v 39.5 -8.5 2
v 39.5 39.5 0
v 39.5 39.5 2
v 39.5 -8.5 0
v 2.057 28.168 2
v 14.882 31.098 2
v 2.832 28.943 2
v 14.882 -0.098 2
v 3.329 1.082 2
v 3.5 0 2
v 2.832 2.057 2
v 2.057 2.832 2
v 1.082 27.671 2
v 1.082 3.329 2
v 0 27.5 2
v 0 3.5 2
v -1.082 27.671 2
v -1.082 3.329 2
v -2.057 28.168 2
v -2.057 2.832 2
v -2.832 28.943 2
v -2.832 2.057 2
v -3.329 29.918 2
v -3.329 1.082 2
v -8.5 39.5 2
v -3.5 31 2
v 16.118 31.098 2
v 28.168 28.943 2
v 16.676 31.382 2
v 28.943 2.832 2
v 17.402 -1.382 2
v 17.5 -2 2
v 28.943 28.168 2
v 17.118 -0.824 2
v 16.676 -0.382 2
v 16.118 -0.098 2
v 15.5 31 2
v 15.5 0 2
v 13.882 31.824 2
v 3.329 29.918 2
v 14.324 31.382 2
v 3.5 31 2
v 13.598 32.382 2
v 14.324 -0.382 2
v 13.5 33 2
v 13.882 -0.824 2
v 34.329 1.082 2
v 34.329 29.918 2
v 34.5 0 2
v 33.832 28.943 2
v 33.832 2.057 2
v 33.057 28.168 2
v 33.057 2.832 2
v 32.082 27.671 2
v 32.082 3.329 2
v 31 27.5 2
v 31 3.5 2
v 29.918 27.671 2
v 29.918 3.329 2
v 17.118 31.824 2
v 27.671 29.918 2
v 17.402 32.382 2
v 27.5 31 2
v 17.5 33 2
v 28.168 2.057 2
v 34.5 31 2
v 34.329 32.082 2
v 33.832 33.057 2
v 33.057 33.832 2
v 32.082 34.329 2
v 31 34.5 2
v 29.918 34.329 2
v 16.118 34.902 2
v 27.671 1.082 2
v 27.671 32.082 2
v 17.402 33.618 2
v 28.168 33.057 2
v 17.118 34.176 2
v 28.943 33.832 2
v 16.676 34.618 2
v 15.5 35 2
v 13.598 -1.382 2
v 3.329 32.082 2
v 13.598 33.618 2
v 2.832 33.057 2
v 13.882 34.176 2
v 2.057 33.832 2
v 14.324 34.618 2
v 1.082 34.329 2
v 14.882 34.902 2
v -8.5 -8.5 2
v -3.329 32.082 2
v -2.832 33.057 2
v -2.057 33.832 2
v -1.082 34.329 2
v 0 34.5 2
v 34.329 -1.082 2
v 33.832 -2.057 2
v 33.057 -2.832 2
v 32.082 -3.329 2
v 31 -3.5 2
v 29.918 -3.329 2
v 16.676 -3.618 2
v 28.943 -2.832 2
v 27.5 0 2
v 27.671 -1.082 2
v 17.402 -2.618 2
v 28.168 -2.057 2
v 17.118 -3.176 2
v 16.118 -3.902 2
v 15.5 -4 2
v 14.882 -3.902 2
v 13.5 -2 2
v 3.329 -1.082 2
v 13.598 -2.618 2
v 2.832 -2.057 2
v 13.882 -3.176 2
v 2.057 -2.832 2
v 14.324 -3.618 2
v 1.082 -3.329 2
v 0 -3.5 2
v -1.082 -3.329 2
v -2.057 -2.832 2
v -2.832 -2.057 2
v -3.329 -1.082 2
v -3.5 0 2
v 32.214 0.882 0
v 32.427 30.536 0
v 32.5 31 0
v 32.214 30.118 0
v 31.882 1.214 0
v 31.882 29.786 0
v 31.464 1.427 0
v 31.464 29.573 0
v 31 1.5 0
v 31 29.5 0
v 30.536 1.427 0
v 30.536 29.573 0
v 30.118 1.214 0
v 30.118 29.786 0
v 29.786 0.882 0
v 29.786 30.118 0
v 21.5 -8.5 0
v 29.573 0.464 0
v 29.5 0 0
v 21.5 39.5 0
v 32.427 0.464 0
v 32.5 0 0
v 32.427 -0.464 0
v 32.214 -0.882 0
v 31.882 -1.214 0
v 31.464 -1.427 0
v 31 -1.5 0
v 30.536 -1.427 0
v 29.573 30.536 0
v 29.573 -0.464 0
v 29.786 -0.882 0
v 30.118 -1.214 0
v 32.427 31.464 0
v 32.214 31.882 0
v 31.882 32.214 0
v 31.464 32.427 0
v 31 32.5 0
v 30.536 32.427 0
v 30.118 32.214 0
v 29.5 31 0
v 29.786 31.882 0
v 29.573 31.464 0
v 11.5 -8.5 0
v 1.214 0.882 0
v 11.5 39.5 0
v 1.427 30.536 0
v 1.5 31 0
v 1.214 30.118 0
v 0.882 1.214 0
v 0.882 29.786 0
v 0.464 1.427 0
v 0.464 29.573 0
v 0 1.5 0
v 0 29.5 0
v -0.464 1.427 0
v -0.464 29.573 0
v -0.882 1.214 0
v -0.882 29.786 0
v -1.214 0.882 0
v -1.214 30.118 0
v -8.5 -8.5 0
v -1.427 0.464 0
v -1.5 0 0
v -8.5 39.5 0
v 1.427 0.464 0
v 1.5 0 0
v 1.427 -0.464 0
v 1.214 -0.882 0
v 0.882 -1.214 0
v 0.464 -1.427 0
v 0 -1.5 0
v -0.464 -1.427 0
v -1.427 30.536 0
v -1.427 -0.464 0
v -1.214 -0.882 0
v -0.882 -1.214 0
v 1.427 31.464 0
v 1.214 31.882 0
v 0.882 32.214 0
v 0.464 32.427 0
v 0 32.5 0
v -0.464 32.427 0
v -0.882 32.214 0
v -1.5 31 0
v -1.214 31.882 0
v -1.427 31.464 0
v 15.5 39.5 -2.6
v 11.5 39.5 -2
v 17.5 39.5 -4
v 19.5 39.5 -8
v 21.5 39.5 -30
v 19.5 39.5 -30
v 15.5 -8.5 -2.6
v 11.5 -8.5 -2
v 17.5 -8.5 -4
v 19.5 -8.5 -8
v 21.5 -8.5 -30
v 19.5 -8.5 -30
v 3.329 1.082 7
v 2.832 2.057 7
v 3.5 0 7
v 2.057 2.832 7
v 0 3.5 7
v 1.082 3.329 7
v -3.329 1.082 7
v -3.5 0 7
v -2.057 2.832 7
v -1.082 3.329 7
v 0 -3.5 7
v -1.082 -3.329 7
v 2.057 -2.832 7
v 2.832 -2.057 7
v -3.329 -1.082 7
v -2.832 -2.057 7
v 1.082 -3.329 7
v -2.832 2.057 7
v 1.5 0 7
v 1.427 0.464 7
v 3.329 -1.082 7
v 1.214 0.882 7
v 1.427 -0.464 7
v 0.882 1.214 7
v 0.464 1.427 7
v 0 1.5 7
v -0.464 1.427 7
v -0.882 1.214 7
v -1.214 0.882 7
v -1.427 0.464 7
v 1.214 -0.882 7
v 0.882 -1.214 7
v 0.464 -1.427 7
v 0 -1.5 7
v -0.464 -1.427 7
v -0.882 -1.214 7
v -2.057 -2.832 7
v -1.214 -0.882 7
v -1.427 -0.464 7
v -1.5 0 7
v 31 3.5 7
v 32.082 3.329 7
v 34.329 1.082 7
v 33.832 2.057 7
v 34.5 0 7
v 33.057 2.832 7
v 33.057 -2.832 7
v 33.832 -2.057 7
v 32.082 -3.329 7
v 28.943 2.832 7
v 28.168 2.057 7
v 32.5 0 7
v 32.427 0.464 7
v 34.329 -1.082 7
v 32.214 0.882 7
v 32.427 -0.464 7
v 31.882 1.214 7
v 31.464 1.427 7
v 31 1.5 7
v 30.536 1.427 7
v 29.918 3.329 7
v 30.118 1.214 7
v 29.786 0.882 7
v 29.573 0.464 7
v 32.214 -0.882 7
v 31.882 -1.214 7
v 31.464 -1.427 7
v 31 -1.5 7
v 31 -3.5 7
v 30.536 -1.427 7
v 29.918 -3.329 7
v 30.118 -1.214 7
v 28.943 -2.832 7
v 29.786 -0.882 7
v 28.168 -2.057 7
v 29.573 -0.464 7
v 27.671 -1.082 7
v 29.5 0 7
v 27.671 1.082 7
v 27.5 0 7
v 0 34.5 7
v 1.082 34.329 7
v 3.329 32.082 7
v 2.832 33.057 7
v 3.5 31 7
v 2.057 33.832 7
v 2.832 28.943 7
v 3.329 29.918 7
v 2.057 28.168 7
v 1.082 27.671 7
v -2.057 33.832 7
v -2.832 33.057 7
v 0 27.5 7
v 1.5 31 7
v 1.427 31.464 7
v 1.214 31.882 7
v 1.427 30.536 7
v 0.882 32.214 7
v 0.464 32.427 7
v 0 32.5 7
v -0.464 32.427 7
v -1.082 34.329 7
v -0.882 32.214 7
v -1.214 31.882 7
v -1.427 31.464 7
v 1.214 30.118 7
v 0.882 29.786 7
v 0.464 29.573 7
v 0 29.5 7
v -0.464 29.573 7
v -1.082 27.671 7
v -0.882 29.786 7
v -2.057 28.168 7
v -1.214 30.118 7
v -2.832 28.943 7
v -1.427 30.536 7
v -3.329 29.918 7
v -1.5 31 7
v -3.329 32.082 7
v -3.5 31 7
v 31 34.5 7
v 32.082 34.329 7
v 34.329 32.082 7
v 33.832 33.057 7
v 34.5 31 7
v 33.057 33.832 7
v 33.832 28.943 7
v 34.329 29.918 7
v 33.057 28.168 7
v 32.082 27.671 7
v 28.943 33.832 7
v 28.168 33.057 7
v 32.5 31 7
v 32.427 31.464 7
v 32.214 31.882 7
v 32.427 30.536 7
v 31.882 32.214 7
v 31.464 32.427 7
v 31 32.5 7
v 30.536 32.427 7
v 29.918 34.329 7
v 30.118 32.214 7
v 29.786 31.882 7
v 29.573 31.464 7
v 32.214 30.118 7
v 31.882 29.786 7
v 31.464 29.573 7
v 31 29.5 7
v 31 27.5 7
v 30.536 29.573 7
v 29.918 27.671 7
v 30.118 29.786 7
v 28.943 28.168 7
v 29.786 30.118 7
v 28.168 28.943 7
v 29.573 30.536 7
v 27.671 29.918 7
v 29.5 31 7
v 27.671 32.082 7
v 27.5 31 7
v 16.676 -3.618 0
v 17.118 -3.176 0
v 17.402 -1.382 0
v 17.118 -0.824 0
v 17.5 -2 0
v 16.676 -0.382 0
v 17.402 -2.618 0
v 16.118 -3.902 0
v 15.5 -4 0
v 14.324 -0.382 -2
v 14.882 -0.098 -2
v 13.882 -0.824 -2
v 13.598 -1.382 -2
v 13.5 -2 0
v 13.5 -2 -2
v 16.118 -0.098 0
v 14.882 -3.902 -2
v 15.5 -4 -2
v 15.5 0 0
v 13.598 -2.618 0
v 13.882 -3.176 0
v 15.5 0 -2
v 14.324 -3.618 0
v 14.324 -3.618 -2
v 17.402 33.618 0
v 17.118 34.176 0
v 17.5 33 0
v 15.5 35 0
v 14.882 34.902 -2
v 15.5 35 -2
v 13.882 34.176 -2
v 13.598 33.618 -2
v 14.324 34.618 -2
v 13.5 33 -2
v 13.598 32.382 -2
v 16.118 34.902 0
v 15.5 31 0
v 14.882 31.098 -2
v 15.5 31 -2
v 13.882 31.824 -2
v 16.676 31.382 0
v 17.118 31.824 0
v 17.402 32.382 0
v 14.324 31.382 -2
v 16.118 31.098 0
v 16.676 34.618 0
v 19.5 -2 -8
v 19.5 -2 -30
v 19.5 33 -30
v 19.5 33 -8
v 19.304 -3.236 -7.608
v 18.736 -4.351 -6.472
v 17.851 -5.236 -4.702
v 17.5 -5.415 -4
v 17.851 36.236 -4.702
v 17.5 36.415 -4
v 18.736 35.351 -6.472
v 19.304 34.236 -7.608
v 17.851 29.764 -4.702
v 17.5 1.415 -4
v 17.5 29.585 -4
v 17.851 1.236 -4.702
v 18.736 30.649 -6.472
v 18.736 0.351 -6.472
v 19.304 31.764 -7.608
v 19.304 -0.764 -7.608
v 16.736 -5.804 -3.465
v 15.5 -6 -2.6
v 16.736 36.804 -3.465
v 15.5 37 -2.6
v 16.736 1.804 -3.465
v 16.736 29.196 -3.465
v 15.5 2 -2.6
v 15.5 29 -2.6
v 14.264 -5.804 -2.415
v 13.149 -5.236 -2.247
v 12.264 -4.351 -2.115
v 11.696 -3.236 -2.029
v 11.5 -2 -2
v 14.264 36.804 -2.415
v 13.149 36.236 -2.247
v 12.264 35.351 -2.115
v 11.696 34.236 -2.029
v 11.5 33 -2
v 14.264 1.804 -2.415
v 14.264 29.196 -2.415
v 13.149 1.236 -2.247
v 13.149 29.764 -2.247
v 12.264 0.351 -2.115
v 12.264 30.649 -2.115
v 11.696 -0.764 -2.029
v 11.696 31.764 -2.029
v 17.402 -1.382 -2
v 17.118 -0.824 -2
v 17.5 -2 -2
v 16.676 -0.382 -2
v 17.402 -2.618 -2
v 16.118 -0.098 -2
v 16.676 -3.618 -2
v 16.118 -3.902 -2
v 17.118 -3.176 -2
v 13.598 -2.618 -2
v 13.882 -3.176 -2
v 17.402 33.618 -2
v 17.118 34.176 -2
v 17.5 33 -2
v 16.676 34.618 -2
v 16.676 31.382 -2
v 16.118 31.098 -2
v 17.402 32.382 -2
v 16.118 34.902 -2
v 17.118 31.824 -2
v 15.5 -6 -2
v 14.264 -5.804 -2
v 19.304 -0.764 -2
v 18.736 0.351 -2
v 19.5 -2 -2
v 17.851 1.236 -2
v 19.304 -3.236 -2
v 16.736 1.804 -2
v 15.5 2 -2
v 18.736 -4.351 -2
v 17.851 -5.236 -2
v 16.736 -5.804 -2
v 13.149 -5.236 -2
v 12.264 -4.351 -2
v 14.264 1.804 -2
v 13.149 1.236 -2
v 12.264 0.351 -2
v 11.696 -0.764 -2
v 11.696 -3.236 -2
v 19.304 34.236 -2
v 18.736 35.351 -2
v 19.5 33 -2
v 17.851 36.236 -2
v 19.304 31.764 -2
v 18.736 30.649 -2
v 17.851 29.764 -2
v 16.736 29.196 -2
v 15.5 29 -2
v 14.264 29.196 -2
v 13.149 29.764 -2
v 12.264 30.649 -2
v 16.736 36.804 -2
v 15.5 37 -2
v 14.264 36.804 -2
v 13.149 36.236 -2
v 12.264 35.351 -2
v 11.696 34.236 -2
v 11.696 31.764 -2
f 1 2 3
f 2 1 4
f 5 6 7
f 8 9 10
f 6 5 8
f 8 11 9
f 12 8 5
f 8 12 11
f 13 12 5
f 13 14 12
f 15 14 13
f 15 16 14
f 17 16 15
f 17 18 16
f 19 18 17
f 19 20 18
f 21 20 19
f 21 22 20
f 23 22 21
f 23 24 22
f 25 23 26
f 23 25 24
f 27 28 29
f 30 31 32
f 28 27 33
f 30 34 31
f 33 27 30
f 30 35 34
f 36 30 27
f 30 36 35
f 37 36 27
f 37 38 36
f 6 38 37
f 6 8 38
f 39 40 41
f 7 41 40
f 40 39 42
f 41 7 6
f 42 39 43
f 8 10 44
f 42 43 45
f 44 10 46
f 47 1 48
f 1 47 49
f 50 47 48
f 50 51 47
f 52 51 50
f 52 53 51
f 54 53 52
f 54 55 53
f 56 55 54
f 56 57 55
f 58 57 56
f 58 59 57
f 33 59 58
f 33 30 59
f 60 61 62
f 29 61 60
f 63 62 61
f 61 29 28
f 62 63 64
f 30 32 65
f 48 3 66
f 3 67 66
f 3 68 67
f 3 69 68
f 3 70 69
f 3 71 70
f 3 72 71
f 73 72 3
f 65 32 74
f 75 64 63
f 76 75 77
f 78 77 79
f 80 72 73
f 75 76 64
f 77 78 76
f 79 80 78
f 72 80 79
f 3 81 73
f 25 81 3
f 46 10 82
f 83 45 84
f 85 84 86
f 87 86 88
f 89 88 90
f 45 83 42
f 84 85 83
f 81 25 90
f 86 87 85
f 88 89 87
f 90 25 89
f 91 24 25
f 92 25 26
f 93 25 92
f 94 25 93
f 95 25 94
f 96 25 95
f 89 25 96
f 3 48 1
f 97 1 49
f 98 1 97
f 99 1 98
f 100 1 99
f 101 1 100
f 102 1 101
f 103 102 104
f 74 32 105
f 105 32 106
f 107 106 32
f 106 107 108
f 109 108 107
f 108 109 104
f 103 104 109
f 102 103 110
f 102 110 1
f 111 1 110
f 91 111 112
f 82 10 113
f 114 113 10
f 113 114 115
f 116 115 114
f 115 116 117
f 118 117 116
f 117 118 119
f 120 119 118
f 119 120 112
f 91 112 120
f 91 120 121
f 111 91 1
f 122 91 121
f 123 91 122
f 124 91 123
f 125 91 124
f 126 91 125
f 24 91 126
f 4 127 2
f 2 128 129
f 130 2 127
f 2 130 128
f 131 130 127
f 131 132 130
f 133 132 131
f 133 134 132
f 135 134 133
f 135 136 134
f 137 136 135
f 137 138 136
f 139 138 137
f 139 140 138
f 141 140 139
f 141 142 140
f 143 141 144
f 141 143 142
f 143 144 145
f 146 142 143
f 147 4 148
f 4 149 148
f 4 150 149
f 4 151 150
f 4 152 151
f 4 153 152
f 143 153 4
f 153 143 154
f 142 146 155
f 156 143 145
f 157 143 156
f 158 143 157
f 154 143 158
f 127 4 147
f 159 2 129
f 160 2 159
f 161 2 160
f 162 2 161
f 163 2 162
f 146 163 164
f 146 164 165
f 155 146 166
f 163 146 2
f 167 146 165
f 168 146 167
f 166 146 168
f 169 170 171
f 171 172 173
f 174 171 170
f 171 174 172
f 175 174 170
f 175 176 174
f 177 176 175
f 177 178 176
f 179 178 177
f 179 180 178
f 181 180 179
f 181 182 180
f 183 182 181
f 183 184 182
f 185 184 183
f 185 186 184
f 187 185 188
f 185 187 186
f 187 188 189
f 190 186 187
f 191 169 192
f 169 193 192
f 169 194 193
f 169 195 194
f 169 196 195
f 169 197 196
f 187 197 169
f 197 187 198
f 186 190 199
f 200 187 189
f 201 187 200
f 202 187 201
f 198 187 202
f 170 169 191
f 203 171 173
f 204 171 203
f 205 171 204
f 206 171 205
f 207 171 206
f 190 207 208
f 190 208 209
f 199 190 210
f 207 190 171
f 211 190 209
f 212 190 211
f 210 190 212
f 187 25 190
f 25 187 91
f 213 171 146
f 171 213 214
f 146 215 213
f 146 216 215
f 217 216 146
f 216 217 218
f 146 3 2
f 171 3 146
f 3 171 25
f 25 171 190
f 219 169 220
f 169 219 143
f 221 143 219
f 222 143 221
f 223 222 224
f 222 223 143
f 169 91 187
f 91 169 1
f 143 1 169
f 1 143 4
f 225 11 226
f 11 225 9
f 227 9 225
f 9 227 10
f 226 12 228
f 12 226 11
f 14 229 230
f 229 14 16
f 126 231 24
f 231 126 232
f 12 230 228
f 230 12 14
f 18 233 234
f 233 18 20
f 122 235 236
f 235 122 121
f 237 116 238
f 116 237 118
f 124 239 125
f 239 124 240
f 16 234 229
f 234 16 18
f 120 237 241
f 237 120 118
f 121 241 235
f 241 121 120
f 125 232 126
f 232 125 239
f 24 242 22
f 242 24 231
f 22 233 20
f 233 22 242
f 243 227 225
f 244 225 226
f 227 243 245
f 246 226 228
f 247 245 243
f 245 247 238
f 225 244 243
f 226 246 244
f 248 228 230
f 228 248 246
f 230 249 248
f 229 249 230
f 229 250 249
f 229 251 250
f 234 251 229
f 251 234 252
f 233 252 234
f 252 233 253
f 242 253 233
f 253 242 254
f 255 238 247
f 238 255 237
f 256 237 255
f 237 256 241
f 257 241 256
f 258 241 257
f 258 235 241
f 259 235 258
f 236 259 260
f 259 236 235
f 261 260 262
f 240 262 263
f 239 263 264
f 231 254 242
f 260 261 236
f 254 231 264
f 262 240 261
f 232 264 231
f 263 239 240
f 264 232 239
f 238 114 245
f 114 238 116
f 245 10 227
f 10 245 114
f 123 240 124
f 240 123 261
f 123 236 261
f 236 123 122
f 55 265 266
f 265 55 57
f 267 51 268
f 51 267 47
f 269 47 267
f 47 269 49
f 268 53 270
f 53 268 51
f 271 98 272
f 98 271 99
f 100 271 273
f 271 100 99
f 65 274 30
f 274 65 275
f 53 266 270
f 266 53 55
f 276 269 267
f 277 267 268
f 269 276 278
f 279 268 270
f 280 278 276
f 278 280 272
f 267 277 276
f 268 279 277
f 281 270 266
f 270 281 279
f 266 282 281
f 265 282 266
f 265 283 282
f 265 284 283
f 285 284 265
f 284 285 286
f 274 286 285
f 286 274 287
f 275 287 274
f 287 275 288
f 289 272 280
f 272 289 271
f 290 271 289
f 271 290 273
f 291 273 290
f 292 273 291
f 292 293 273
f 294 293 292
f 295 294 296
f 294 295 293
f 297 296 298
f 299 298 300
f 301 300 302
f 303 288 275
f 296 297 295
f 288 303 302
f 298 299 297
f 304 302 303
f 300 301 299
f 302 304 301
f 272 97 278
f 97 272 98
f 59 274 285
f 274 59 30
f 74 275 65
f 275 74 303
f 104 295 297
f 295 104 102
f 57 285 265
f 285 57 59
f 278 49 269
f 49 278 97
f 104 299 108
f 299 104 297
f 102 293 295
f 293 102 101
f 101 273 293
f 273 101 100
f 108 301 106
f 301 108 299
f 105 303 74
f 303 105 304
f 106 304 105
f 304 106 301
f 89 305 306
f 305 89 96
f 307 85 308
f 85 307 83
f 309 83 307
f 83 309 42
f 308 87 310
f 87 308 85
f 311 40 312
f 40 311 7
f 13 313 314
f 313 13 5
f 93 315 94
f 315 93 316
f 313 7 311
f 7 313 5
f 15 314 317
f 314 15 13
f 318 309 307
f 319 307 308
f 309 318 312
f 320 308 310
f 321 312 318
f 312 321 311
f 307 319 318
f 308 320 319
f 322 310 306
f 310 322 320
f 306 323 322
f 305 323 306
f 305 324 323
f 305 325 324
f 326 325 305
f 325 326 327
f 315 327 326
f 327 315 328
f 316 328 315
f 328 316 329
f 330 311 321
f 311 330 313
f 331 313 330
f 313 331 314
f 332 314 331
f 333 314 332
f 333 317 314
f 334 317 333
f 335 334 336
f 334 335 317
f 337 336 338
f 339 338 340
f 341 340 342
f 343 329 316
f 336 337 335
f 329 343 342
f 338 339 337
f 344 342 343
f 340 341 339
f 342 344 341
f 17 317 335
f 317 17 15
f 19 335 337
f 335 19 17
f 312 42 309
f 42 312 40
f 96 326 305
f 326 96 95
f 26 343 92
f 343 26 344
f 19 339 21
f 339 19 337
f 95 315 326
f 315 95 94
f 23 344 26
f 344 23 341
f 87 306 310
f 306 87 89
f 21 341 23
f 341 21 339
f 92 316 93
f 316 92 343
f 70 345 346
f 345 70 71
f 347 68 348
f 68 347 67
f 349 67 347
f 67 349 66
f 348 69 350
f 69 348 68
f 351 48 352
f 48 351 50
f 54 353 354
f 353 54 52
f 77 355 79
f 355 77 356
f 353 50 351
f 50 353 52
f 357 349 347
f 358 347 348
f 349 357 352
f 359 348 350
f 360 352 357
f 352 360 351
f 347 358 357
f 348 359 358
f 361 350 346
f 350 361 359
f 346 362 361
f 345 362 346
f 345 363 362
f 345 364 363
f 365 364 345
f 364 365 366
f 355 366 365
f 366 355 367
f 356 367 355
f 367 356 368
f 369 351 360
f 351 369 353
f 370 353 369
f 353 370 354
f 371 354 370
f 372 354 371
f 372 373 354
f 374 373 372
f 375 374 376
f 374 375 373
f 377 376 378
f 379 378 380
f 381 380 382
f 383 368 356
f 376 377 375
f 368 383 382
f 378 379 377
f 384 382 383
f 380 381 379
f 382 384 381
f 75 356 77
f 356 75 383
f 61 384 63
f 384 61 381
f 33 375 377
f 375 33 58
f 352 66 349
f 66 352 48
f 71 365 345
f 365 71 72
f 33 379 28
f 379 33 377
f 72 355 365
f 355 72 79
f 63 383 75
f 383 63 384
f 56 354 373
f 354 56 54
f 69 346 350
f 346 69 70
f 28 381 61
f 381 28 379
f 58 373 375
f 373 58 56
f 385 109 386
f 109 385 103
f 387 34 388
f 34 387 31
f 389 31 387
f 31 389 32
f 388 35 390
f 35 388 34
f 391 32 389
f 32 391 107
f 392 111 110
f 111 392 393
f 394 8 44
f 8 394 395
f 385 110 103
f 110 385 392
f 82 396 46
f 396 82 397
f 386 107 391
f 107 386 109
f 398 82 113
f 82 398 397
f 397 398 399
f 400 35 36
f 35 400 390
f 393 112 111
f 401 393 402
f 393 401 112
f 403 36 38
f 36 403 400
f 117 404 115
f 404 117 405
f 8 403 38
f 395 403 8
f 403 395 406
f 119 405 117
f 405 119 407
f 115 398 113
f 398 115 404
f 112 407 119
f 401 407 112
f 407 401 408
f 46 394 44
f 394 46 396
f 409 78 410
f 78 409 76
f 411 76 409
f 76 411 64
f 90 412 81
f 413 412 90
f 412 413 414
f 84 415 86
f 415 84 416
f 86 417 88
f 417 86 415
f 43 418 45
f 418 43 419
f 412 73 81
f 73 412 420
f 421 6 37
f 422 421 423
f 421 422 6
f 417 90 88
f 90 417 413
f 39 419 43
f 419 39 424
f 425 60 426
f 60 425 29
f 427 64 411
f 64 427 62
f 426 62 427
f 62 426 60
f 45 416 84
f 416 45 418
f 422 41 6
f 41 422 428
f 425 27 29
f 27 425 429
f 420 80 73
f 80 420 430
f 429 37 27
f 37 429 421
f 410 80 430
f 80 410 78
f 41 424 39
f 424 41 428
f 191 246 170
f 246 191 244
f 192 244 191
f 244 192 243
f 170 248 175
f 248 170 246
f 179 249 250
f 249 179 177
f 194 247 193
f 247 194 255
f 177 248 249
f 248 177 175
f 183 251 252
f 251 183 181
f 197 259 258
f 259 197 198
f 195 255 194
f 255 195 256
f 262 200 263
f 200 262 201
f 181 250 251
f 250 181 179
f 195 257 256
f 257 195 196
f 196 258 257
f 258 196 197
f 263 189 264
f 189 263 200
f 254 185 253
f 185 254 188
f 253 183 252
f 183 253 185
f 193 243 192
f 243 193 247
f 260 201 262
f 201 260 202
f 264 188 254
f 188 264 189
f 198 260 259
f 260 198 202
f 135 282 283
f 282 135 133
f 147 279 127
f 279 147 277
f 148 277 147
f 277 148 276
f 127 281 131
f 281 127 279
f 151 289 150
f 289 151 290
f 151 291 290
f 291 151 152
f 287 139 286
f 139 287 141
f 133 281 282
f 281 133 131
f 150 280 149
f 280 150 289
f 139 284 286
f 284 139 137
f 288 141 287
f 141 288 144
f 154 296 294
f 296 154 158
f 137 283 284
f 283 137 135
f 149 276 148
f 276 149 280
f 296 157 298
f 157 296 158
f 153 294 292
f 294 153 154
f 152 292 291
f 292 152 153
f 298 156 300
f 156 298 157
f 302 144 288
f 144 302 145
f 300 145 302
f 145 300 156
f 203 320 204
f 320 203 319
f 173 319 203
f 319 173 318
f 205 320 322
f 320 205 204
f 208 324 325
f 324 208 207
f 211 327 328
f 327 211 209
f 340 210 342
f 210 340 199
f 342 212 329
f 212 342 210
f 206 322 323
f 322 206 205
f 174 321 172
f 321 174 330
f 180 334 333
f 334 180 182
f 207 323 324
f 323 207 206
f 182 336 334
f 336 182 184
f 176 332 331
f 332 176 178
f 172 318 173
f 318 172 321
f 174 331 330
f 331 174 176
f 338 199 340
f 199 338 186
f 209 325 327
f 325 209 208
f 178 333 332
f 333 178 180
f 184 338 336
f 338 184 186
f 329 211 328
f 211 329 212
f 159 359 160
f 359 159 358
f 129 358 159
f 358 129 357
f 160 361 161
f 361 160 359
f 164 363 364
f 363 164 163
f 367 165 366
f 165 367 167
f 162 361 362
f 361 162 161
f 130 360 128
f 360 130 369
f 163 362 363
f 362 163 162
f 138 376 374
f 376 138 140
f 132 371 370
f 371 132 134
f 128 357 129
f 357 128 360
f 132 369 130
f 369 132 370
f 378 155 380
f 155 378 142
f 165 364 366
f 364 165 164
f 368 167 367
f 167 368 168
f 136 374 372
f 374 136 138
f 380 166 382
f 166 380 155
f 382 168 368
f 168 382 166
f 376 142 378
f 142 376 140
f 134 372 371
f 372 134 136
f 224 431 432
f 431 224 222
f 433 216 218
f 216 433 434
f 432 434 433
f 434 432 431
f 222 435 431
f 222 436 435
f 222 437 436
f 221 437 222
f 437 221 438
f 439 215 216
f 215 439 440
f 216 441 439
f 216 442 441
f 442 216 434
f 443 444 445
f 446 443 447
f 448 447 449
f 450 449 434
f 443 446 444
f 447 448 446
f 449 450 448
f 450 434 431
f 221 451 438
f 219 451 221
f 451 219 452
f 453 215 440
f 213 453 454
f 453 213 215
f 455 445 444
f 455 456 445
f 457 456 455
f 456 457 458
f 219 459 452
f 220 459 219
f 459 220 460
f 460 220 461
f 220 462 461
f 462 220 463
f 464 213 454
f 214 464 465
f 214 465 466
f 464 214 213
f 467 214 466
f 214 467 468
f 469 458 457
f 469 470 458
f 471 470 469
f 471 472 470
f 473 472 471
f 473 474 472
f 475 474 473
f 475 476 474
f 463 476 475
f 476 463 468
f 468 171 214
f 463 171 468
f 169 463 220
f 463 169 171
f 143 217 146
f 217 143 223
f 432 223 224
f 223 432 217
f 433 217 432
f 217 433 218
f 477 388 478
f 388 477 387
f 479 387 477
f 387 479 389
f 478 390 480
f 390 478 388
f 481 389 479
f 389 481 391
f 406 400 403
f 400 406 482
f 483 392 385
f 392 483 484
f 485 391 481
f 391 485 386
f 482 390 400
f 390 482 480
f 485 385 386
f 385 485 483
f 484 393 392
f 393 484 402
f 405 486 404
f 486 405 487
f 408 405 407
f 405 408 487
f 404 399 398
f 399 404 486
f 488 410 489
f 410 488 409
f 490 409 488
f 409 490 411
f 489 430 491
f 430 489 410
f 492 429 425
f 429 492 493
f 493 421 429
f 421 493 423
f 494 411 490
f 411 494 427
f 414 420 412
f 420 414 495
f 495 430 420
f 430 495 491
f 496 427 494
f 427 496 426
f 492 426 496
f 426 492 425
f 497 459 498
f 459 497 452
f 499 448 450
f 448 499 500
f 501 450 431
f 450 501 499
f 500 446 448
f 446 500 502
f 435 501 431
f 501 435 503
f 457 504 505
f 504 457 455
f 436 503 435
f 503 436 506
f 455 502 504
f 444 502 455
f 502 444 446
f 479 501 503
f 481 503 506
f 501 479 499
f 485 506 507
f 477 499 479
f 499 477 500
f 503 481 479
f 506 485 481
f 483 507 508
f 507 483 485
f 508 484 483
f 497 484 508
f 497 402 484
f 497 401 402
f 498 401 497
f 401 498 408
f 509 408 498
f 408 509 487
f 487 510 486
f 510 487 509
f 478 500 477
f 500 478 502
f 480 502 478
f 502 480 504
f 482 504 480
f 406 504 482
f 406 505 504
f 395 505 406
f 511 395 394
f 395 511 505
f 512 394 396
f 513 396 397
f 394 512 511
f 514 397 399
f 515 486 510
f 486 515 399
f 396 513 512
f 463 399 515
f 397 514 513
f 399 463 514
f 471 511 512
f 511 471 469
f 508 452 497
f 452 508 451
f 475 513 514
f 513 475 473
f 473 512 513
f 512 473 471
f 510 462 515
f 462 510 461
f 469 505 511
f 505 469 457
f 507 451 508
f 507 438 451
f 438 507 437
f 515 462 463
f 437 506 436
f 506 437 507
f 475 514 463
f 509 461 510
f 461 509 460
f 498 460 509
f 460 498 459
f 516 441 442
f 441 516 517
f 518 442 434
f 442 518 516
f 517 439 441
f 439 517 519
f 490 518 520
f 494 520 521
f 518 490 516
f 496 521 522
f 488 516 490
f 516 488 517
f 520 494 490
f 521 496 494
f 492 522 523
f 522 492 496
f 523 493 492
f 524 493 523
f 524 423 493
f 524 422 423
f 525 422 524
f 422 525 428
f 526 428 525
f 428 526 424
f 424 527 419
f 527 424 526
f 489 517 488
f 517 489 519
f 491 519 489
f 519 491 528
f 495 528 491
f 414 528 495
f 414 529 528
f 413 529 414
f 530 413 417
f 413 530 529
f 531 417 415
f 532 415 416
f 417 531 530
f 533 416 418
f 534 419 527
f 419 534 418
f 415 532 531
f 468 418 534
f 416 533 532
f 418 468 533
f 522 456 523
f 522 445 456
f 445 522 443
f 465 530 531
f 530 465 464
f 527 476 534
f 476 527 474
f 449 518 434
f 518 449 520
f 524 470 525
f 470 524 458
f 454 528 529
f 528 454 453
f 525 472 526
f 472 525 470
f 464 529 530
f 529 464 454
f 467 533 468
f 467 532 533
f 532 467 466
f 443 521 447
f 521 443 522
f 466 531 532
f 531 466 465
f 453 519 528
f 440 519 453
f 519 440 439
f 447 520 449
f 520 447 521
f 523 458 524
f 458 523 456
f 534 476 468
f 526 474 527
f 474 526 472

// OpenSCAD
fc_holder = true;
fc_holder_bottom = true;

fc_hole_r = 1.5;
hr = 2;

hole_margin_fc = 31;
fc_h = 7;
hole_margin_holder = 35;
s = 2;
h_down = 30;

$fn =20;
w = hole_margin_fc+2*s+fc_hole_r*2;
margin_base = 5;
if(fc_holder) {
difference(){
union() {
    translate([-s-fc_hole_r-margin_base,-s-fc_hole_r-margin_base,0])cube([w+2*margin_base,w+2*margin_base,s]);
    cylinder(fc_h,fc_hole_r+s,fc_hole_r+s);
    translate([hole_margin_fc,0,0])cylinder(fc_h,fc_hole_r+s,fc_hole_r+s);
    translate([0,hole_margin_fc,0])cylinder(fc_h,fc_hole_r+s,fc_hole_r+s);
    translate([hole_margin_fc,hole_margin_fc,0])cylinder(fc_h,fc_hole_r+s,fc_hole_r+s);
}
    cylinder(fc_h,fc_hole_r,fc_hole_r);
    translate([hole_margin_fc,0,0])cylinder(fc_h,fc_hole_r,fc_hole_r);
    translate([0,hole_margin_fc,0])cylinder(fc_h,fc_hole_r,fc_hole_r);
    translate([hole_margin_fc,hole_margin_fc,0])cylinder(fc_h,fc_hole_r,fc_hole_r);

translate([-fc_hole_r-s+w/2,-fc_hole_r-s+(w-hole_margin_holder)/2,0]){
        cylinder(s,hr,hr);
        translate([0,hole_margin_holder,0])cylinder(s,hr,hr);
    
    }

}
}

if(fc_holder_bottom) {

translate([-s-fc_hole_r+hr*3+w/2,-s-fc_hole_r,-0]){
    difference(){
    rotate([0,90,90])translate([0,0,-margin_base])linear_extrude(w+2*margin_base)polygon([[0,0],[0,hr*5],[s,hr*5],[s*1.3,s*3],[s*2,s*2],[s*4,s*1],[h_down,s],[h_down,0]]);
    translate([-s*3,(w-hole_margin_holder)/2,-50])cylinder(100,hr,hr);
    translate([-s*3,(w-hole_margin_holder)/2+hole_margin_holder,-50])cylinder(100,hr,hr);
    translate([-s*3,(w-hole_margin_holder)/2,-100-s])cylinder(100,hr*2,hr*2);
    translate([-s*3,(w-hole_margin_holder)/2+hole_margin_holder,-100-s])cylinder(100,hr*2,hr*2);

    }
}
}
